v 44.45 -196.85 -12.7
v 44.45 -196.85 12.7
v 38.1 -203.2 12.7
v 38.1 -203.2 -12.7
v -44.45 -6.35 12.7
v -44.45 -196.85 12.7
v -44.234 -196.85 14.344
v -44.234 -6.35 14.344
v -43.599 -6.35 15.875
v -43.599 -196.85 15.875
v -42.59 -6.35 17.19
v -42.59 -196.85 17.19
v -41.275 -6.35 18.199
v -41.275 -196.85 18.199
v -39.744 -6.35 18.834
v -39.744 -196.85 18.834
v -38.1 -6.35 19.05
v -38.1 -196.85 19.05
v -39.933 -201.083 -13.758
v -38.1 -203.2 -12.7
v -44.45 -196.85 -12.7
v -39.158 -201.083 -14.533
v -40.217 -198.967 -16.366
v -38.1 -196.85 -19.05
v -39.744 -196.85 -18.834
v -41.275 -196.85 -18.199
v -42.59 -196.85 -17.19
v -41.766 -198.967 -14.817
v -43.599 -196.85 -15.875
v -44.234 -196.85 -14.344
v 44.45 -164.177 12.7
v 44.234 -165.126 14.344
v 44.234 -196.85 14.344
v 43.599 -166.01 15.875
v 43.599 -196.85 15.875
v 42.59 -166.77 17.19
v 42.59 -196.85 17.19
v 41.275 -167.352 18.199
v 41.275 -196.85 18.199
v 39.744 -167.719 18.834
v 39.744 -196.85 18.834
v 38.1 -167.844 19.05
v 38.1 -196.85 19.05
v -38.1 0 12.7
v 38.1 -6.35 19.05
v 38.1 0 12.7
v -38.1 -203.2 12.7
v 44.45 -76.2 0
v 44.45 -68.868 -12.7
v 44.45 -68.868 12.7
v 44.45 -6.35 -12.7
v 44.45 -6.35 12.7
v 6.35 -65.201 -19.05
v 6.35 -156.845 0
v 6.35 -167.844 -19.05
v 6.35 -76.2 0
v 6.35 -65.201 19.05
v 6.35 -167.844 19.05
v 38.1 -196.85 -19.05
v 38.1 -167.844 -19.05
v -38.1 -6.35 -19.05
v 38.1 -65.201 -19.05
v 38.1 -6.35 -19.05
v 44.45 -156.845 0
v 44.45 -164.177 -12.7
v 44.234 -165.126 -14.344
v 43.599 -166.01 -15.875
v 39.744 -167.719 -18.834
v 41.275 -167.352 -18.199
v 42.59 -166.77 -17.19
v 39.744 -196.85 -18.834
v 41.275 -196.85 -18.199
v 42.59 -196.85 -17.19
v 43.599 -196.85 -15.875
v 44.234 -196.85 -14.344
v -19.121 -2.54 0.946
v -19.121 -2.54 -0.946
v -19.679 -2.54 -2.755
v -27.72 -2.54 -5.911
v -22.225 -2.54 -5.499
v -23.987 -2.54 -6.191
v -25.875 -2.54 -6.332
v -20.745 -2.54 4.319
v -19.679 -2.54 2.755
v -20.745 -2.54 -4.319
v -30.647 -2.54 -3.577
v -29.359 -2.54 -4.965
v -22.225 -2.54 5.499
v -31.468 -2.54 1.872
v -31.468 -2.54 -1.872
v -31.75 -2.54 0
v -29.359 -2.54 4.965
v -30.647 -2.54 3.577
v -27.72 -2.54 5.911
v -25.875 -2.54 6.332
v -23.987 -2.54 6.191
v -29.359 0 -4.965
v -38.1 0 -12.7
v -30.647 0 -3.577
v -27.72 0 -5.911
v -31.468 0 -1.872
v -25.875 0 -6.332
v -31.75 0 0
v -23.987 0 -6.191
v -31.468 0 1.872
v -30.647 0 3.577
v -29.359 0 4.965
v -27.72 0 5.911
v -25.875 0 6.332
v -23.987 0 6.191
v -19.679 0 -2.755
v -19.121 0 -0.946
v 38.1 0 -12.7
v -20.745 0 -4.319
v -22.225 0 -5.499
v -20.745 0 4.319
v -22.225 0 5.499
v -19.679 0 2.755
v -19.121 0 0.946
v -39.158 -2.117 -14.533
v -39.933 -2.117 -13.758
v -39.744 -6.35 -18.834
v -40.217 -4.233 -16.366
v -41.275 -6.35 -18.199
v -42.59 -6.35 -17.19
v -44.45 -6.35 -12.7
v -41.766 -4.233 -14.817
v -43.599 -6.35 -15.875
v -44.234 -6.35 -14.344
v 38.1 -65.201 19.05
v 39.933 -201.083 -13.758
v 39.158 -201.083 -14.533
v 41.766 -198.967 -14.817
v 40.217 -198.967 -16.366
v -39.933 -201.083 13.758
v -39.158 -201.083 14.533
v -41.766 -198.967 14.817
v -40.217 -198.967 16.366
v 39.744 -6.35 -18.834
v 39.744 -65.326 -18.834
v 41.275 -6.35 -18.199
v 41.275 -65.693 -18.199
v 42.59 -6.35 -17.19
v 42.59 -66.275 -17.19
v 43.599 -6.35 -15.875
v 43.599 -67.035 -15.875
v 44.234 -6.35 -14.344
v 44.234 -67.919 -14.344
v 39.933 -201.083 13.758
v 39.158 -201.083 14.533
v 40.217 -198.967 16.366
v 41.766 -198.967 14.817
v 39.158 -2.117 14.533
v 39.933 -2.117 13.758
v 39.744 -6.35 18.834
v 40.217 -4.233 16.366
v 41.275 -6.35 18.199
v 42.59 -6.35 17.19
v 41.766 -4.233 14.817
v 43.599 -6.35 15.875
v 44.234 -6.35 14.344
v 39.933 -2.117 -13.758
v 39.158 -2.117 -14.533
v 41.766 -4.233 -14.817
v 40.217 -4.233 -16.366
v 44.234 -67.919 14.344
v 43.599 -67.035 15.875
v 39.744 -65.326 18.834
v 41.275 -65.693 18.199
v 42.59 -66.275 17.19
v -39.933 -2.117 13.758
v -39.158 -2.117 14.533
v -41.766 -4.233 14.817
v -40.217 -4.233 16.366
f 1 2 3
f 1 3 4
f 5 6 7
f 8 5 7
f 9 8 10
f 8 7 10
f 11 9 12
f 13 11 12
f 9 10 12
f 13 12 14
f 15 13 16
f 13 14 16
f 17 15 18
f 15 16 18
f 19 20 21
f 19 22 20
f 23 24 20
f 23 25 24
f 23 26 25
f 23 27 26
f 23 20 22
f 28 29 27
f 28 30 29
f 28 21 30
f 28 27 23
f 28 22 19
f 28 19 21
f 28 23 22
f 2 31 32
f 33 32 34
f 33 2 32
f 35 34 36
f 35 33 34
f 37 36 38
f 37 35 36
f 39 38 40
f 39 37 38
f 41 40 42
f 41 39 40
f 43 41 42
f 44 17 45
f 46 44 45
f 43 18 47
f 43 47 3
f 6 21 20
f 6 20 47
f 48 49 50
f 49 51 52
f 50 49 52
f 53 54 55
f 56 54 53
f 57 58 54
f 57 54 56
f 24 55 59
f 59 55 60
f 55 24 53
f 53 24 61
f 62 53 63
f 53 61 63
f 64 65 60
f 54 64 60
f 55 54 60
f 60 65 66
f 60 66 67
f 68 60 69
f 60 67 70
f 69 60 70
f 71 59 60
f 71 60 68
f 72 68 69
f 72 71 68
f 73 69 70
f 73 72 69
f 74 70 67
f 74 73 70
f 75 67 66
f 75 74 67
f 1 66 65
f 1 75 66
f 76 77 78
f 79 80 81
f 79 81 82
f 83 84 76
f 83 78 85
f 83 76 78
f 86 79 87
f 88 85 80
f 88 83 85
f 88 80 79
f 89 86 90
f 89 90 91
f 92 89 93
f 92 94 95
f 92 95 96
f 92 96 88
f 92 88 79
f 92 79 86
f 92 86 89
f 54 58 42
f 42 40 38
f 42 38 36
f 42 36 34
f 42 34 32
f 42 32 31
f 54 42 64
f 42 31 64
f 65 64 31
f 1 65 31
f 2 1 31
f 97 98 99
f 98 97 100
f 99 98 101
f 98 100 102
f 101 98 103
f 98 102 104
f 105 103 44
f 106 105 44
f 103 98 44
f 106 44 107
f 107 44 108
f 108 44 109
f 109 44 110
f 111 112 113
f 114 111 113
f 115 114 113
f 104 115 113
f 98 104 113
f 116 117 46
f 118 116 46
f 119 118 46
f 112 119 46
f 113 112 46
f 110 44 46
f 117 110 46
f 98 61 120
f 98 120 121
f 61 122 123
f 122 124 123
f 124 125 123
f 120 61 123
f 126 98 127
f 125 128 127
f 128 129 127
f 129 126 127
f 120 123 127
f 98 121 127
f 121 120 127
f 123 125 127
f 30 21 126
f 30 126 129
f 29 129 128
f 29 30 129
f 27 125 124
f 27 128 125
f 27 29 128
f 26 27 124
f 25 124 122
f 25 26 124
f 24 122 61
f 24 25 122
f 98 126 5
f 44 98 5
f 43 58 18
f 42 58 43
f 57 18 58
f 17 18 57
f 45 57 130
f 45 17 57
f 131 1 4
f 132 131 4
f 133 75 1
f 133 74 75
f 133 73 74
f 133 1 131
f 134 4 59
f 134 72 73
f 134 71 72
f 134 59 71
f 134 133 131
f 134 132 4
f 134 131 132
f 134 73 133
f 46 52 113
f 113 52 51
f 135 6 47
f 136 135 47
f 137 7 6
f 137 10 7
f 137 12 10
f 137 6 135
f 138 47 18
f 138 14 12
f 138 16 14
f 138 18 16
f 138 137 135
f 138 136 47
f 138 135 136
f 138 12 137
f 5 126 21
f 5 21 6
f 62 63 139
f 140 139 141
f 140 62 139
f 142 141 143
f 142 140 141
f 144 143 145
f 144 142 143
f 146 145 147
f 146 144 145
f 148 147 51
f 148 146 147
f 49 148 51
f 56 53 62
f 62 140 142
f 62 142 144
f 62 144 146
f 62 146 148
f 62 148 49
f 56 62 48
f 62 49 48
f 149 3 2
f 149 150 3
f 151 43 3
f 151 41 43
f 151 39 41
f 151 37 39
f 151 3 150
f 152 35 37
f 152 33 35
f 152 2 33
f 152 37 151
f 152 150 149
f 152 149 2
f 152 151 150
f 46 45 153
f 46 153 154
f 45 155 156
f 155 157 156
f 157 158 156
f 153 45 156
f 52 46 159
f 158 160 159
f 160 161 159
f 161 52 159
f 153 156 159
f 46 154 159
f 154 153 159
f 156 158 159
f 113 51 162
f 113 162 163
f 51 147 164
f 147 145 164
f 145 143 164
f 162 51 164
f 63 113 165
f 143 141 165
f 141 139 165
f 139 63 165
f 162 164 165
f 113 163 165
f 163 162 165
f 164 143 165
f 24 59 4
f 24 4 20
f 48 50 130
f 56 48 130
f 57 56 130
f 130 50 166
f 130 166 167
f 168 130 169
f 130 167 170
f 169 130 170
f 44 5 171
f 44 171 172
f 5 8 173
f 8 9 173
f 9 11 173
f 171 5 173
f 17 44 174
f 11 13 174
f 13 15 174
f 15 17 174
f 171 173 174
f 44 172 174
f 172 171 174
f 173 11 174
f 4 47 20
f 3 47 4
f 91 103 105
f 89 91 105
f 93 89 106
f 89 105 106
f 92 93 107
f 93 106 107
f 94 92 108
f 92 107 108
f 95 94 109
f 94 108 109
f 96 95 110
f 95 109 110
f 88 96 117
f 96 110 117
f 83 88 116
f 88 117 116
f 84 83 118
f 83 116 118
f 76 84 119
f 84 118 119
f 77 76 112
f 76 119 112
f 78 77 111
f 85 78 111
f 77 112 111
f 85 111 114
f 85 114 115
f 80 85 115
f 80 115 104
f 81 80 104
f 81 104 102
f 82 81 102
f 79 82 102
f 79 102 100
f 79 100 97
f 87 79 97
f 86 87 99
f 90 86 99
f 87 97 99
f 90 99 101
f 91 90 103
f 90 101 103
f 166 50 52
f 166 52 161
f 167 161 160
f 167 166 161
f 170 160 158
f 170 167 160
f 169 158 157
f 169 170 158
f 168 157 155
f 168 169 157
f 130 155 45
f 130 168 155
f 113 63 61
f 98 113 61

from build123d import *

# Parameters (mm, degrees)
F0_W     = 88.9
F0_H     = 38.1
F1_DEPTH = 203.2
F2_R     = 6.35
F3_SIZE  = 6.35
F4_SIZE  = 6.35
F6_DEPTH = 38.1
F7_R     = 6.35
F8_DEPTH = 2.54


with BuildPart() as f1:
    # F0 (on Front) → F1 (new body)
    with BuildSketch(Plane.XZ):
        Rectangle(F0_W, F0_H)
    extrude(amount=F1_DEPTH)

    # F2
    f2_edges = [f1.edges().sort_by_distance(p)[0] for p in [
        (-44.45, -101.6, 19.05),
        (-44.45, -101.6, -19.05),
        (44.45, -101.6, 19.05),
        (44.45, -101.6, -19.05),
    ]]
    fillet(f2_edges, radius=F2_R)

    # F3
    f3_edges = [f1.edges().sort_by_distance(p)[0] for p in [
        (0, -203.2, 19.05),
    ]]
    chamfer(f3_edges, length=F3_SIZE)

    # F4
    f4_edges = [f1.edges().sort_by_distance(p)[0] for p in [
        (0, 0, 19.05),
    ]]
    chamfer(f4_edges, length=F4_SIZE)

    # F5 (on face) → F6 (cut)
    with BuildSketch(Plane.YZ.offset(44.45)):
        Polygon((-46.870606, -50.8), (-76.2, 0), (-156.845, 0), (-186.174394, -50.8), align=None)
        Polygon((-156.845, 0), (-76.2, 0), (-46.870606, 50.8), (-186.174394, 50.8), align=None)
    extrude(amount=-F6_DEPTH, mode=Mode.SUBTRACT)

    # F7 (on face) → F8 (cut)
    with BuildSketch(Plane(origin=(0, 0, 0), x_dir=(-1, 0, 0), z_dir=(0, 1, 0))):
        with Locations((25.4, 0)):
            Circle(F7_R)
    extrude(amount=-F8_DEPTH, mode=Mode.SUBTRACT)


solid = f1.part
